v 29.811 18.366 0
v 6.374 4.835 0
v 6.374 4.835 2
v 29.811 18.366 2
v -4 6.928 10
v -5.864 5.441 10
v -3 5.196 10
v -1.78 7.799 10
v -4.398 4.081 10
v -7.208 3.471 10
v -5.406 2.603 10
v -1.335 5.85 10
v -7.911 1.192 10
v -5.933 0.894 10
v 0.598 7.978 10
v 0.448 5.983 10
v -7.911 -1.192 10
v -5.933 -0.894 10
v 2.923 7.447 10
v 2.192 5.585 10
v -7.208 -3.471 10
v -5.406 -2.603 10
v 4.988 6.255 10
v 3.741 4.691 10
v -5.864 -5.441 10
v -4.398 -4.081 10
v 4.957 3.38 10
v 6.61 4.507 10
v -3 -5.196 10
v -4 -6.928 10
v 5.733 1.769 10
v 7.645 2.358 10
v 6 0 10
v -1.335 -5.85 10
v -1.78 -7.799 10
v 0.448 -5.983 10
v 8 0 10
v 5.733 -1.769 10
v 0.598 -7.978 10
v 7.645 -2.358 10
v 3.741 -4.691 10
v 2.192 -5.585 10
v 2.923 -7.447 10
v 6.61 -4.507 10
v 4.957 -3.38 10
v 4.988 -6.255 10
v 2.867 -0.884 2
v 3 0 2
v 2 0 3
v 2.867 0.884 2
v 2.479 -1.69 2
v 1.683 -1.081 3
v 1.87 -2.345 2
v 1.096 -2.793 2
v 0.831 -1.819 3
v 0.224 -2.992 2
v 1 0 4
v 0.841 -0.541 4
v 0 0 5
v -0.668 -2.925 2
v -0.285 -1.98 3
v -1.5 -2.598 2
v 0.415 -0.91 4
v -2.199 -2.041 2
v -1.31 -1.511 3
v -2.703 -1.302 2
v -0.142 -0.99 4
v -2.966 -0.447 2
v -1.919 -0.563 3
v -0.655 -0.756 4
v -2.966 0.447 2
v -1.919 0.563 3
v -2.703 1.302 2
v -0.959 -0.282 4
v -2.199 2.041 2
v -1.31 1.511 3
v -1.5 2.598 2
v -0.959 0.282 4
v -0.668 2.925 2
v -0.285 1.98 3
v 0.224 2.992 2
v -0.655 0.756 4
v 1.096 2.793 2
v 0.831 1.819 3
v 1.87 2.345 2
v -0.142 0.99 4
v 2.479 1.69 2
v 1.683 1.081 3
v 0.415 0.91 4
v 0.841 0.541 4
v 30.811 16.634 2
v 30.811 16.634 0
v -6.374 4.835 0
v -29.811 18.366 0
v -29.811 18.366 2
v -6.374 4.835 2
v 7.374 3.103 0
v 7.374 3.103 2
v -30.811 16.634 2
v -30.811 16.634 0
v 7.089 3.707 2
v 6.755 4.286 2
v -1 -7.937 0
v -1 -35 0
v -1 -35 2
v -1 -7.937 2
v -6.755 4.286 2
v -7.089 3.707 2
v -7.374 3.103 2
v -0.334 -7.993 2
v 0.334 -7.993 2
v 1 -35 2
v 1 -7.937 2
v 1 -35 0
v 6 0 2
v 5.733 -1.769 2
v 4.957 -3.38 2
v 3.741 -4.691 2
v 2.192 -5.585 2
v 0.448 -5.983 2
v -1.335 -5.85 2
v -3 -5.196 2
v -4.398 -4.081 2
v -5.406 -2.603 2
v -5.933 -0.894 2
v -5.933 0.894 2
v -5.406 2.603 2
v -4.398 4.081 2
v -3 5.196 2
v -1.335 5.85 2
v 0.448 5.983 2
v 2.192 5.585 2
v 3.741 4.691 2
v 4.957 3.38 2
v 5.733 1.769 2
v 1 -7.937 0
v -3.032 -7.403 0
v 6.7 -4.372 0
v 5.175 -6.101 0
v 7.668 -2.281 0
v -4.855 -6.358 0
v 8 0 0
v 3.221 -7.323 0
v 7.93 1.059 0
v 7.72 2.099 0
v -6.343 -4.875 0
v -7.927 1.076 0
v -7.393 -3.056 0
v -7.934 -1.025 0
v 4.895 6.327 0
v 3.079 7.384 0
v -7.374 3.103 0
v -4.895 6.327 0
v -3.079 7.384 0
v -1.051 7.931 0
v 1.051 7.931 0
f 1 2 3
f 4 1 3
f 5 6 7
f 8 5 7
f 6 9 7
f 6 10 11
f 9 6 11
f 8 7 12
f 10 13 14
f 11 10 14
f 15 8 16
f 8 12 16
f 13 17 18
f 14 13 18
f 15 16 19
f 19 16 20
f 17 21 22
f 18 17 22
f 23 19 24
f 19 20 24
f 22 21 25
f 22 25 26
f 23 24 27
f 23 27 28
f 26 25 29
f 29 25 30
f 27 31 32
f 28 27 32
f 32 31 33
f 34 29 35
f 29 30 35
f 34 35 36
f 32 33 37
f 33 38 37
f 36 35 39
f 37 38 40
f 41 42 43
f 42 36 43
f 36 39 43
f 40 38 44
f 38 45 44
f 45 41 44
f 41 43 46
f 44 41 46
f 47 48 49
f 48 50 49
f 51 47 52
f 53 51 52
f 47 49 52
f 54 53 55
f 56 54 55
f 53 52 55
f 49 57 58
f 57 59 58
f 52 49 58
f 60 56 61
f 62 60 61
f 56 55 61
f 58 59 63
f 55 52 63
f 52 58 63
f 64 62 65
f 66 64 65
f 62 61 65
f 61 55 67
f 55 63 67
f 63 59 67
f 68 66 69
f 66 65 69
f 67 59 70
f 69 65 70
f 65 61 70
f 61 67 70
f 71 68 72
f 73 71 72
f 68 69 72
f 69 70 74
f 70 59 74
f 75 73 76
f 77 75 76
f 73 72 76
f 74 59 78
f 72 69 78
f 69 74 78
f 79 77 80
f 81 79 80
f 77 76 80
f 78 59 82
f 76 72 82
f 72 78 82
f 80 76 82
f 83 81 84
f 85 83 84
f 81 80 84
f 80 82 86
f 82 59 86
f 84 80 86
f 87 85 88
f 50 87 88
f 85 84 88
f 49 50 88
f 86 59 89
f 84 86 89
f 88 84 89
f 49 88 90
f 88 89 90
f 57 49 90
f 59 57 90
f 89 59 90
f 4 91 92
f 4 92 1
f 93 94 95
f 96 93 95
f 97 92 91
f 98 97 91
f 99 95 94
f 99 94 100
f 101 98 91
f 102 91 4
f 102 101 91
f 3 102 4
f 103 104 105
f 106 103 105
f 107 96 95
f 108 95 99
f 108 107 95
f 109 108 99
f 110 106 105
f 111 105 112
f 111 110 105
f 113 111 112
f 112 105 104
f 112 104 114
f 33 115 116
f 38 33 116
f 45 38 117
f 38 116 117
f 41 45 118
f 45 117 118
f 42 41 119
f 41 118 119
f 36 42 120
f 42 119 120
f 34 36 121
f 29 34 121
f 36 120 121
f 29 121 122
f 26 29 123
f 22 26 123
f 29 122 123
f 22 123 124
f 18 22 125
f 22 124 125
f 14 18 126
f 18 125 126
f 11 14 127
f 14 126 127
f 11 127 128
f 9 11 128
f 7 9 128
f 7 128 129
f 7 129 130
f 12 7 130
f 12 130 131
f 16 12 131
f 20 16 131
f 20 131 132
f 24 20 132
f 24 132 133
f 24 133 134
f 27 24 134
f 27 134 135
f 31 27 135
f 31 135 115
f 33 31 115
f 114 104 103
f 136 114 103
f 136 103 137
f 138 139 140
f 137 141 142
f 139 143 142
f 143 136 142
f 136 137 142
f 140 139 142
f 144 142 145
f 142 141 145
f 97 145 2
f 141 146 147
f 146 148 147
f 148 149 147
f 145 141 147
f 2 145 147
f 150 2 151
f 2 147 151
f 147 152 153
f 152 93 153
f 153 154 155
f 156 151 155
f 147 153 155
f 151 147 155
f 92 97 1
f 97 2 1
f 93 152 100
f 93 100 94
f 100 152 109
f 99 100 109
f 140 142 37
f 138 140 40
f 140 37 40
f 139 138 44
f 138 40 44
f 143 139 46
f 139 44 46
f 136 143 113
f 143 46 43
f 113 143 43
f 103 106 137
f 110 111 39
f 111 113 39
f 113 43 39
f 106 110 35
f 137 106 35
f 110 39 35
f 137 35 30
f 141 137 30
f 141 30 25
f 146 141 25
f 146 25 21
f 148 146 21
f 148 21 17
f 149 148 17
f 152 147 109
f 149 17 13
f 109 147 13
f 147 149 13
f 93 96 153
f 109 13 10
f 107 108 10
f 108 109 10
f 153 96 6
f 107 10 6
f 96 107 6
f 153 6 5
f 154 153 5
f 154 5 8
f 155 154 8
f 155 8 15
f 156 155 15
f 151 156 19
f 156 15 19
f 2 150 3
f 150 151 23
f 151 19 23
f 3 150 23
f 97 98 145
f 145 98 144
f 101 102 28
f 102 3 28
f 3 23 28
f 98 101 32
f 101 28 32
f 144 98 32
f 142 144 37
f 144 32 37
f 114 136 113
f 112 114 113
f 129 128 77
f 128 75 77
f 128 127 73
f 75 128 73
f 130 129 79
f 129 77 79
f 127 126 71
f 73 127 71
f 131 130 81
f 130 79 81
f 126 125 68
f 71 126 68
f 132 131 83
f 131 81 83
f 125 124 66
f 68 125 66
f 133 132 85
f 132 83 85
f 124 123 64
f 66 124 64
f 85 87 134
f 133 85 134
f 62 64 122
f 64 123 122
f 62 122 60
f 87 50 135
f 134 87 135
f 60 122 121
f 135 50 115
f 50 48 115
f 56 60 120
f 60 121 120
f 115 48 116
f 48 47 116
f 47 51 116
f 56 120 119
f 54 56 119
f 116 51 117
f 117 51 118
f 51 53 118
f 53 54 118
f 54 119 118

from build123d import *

# Parameters (mm, degrees)
F3_W     = 2
F3_H     = 2
F4_DEPTH = 35
F1_COUNT = 3


with BuildPart() as f2:
    # F0 (on Front) → F2 (revolve)
    with BuildSketch(Plane.XZ):
        Polygon((0, 5), (0, 0), (8, 0), (8, 10), (6, 10), (6, 2), (3, 2), align=None)
    revolve(axis=Axis((0, 0, 2.5), (0, 0, -1)))

    # F3 (on Front) → F4 (join)
    with BuildSketch(Plane.XZ):
        with Locations((0, 1)):
            Rectangle(F3_W, F3_H)
    extrude(amount=F4_DEPTH)

    # F1: F2 ×3 about axis
    f1_axis = Axis((0, 0, 2), (0, 0, 1))


with BuildPart() as f2_1:
    add(f2.part)
    for i in range(1, F1_COUNT):
        add(f2.part.rotate(f1_axis, i * 360 / F1_COUNT))


solid = f2_1.part
